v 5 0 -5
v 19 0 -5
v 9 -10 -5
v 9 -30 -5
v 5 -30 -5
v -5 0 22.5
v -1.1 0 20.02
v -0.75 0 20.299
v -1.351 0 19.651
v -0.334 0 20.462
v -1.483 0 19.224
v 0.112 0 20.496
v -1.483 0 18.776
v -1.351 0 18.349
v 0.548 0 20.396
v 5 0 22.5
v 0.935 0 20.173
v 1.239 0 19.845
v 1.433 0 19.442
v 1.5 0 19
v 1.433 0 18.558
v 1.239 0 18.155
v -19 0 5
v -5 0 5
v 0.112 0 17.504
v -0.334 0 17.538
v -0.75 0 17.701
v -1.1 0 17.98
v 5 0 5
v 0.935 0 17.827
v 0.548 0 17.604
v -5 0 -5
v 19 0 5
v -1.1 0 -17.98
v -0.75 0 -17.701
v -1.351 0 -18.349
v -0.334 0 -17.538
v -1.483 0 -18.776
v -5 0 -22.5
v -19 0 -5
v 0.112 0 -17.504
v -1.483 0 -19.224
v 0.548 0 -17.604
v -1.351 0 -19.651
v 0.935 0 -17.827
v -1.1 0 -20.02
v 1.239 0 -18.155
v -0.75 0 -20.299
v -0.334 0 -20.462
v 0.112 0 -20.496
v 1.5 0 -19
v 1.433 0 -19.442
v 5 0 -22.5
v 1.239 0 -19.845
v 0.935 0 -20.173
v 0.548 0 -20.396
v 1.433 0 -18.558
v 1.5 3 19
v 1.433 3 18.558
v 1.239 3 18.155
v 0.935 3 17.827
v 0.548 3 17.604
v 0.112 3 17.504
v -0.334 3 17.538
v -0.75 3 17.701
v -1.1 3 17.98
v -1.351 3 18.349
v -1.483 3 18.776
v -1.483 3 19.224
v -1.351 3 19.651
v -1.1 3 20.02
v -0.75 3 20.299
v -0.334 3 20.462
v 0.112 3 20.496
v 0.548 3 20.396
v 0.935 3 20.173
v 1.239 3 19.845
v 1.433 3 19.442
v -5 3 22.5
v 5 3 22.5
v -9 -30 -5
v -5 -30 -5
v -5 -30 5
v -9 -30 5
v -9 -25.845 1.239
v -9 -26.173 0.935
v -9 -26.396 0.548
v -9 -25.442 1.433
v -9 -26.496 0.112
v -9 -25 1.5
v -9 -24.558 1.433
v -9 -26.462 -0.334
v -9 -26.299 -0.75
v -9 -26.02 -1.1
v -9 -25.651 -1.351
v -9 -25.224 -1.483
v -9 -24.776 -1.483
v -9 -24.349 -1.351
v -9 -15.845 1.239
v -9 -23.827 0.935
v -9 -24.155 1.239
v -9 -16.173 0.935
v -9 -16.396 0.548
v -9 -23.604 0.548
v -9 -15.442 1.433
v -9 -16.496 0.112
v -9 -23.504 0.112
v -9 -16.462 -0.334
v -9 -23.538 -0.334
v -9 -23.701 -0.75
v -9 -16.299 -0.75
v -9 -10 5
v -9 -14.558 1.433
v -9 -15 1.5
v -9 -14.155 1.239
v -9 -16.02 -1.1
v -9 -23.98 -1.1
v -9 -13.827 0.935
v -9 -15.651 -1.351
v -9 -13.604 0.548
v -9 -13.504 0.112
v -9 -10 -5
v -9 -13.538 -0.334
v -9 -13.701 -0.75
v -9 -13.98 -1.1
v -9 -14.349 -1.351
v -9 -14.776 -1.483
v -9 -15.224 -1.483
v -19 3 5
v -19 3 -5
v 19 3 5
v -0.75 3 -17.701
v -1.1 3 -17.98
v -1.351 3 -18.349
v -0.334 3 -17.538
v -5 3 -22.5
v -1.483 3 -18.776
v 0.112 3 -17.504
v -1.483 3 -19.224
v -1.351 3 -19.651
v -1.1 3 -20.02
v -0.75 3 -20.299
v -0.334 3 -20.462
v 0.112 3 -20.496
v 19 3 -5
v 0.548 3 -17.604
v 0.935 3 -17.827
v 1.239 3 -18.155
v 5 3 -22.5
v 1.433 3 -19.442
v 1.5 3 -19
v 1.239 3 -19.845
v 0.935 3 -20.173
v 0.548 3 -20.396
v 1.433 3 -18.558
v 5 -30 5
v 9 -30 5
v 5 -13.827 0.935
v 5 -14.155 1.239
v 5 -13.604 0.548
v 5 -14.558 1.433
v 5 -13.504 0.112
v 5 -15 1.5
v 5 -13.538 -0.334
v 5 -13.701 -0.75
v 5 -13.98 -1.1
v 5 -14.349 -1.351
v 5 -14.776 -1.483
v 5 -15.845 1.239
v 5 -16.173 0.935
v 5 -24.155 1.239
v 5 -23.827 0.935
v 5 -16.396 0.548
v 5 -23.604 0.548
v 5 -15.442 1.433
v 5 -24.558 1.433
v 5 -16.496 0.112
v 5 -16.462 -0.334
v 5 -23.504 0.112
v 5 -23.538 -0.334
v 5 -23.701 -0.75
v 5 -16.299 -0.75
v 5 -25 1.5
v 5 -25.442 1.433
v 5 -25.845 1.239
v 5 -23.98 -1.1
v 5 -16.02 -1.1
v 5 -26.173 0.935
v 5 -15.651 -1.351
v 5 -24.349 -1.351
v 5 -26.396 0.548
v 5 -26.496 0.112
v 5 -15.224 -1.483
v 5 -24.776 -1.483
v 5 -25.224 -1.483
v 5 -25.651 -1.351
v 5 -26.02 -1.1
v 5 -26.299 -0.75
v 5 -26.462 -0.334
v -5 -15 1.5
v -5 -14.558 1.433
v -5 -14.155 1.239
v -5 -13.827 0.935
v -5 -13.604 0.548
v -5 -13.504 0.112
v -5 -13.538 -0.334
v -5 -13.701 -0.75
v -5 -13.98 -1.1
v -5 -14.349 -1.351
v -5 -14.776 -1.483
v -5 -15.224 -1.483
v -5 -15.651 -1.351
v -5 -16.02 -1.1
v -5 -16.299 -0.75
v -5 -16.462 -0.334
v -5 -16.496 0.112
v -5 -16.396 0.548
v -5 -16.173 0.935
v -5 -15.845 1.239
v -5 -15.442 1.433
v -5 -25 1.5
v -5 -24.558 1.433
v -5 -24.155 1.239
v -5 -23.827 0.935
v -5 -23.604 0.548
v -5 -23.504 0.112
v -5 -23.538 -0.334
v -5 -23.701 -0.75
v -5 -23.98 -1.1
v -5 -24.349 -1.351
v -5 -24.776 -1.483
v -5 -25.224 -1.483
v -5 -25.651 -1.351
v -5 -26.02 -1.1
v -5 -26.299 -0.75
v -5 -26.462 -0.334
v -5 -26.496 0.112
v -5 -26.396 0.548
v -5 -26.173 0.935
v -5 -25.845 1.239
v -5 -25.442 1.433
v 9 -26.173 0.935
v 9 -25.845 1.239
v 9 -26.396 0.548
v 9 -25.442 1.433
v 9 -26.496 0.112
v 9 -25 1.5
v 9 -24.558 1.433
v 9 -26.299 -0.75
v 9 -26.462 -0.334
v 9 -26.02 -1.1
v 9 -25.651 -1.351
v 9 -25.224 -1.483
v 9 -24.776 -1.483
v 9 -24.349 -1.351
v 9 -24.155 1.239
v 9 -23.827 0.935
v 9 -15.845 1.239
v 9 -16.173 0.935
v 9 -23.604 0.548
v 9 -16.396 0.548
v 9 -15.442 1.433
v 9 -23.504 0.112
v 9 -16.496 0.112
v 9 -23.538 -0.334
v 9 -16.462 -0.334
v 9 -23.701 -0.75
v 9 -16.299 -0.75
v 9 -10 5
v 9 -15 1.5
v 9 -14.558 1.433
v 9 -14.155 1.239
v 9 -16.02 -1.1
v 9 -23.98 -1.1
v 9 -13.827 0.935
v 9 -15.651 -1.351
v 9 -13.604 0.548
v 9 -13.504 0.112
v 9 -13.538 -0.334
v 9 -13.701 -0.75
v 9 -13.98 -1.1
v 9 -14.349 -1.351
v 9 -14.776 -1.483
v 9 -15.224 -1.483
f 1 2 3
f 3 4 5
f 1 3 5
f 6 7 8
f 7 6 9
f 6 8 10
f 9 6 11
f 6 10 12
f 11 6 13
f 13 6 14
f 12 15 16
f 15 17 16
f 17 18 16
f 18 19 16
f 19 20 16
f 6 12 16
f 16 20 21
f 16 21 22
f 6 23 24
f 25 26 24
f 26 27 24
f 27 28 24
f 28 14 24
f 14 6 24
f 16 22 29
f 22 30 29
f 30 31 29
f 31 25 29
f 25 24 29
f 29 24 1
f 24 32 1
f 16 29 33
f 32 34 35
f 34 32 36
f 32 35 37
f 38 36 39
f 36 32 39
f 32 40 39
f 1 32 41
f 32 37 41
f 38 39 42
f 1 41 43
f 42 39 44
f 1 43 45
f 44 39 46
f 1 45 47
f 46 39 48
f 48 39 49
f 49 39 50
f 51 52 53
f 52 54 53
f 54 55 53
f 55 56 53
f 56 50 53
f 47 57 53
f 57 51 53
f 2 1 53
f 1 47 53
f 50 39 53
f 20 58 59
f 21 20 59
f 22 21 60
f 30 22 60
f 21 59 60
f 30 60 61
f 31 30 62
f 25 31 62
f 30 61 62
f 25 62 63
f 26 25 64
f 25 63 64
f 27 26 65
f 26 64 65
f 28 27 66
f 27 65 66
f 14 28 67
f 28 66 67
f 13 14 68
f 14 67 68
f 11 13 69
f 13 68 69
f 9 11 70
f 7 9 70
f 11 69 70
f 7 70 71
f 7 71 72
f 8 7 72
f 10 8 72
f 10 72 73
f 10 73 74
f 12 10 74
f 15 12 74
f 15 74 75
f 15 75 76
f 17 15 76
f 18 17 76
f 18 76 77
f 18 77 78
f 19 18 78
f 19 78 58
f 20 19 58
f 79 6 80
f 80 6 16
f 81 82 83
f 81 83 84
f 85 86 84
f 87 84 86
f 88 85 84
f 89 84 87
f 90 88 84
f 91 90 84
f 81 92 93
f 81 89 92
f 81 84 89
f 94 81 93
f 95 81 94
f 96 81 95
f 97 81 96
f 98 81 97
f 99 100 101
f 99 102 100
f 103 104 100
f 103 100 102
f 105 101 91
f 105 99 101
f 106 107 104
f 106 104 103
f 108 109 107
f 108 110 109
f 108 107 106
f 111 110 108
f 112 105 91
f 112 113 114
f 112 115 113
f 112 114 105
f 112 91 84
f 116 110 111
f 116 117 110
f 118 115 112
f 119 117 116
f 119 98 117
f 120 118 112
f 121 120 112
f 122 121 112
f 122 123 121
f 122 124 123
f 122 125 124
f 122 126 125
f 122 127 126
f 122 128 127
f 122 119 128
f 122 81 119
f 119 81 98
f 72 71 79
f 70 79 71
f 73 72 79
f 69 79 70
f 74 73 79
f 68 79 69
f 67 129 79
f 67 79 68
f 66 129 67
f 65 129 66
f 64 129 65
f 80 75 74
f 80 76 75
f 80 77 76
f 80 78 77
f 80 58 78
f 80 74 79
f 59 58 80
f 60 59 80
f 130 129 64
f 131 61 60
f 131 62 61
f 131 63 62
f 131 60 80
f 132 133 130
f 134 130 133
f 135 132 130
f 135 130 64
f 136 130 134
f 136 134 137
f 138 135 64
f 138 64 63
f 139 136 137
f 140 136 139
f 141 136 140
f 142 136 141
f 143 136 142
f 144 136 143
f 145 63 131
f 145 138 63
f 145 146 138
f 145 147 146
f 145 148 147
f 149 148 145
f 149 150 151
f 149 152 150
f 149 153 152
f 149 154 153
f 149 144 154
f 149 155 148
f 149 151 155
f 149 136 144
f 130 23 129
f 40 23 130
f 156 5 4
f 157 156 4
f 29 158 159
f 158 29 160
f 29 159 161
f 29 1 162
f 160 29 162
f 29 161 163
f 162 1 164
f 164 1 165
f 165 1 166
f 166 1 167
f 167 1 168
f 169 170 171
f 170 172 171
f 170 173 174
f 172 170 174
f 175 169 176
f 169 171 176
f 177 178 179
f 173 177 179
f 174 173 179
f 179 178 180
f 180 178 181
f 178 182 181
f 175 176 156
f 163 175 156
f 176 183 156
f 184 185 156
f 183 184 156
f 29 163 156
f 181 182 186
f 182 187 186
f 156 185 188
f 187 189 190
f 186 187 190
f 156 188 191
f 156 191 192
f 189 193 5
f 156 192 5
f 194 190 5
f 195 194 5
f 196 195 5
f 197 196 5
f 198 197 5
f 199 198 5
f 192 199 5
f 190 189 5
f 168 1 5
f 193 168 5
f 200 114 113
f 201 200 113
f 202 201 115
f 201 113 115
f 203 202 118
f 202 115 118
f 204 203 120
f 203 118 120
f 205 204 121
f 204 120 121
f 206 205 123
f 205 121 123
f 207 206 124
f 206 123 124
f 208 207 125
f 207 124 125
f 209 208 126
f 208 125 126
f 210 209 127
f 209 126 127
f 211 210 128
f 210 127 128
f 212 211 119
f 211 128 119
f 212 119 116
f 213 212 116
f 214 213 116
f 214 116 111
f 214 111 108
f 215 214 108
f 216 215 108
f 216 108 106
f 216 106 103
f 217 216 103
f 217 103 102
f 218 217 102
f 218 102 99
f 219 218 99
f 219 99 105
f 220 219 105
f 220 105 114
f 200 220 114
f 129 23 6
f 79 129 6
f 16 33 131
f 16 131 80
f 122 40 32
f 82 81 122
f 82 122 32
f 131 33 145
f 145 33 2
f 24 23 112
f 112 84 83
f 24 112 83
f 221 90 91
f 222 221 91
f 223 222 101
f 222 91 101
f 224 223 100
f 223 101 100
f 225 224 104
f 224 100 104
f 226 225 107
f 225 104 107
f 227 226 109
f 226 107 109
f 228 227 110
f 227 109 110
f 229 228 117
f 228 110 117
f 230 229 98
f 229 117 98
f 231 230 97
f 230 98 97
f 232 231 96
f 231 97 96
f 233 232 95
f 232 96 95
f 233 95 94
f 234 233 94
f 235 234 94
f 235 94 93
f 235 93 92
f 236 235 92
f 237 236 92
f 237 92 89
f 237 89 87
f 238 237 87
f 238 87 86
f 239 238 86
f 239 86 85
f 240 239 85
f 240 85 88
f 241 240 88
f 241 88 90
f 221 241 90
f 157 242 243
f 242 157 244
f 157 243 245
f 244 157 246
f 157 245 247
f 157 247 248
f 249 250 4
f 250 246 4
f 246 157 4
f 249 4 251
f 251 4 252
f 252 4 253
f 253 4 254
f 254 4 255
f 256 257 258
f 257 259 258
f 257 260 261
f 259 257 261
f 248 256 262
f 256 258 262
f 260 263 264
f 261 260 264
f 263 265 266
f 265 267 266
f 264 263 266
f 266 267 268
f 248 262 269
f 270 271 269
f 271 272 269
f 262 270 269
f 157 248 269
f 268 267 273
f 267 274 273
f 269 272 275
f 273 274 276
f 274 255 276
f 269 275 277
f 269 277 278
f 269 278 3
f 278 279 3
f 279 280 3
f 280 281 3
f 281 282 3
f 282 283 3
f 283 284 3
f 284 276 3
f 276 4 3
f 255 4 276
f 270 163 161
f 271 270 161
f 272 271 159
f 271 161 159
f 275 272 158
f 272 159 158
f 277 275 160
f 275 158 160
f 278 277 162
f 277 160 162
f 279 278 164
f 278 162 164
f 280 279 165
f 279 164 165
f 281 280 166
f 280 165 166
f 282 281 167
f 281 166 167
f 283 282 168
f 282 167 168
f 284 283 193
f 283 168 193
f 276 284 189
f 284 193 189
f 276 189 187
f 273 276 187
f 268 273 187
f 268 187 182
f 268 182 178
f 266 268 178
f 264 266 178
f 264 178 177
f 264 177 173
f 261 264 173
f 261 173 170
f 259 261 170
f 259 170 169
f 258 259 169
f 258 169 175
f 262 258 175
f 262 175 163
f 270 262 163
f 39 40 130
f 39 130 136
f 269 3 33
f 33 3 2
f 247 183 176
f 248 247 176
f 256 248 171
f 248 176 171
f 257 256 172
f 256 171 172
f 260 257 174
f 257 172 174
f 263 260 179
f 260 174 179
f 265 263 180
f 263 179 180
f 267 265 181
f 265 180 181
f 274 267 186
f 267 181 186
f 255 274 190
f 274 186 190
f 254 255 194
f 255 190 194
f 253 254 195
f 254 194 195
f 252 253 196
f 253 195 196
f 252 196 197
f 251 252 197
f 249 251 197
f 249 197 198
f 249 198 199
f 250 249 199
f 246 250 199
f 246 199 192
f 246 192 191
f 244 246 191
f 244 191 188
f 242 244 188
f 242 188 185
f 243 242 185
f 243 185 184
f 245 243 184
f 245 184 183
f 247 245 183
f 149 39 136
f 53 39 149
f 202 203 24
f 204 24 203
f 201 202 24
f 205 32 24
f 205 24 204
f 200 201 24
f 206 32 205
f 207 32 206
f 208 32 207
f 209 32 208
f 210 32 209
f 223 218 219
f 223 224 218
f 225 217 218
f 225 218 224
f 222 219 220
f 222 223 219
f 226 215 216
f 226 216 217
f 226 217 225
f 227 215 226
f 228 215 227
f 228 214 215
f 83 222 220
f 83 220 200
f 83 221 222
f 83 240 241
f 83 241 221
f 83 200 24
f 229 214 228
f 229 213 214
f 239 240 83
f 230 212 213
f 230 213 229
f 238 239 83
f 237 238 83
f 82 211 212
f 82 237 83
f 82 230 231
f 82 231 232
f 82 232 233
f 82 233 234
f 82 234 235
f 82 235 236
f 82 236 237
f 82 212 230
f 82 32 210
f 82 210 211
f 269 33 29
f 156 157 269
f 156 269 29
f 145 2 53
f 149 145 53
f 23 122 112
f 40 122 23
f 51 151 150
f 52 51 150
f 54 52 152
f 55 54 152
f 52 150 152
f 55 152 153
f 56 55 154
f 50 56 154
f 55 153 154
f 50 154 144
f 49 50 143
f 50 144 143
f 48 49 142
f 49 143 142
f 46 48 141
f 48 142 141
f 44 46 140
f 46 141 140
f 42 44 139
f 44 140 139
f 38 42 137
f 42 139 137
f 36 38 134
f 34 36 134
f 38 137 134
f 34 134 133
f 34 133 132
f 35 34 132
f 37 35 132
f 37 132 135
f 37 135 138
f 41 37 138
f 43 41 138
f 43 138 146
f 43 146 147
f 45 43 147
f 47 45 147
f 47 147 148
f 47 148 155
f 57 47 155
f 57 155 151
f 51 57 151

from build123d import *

# Parameters (mm, degrees)
SKETCH_1_W            = 38
SKETCH_1_H            = 45
EXTRUDE_1_DEPTH       = 3
EXTRUDE_2_DEPTH       = 10
HOLE_WIZARD_3_0_3_1_D = 3
HOLE_WIZARD_3_0_3_2_D = 3
CUT_EXTRUDE_1_DEPTH   = 200
MIRROR_3_COPY_1_DEPTH = 200


with BuildPart() as part:
    # 草图1 → 凸台-拉伸1 (new body)
    with BuildSketch(Plane(origin=(0, 0, 0), x_dir=(1, 0, 0), z_dir=(0, 1, 0))):
        Rectangle(SKETCH_1_W, SKETCH_1_H)
    extrude(amount=EXTRUDE_1_DEPTH)

    # 草图3 → 凸台-拉伸2 (add)
    with BuildSketch(Plane(origin=(0, 0, -5), x_dir=(1, 0, 0), z_dir=(0, 0, -1))):
        Polygon((-5, 0), (-5, 30), (-9, 30), (-9, 10), (-19, 0), align=None)
    extrude_2 = extrude(amount=-EXTRUDE_2_DEPTH)

    # 镜向1: 凸台-拉伸2 across plane
    add(extrude_2.mirror(Plane(origin=(0, 0, 0), x_dir=(0, 0, 1), z_dir=(1, 0, 0))))

    # Ø3.0 (3) 直径孔1 (through all)
    with Locations(Plane(origin=(0, 0, 0), x_dir=(-1, 0, 0), z_dir=(0, -1, 0))):
        with Locations((0, -19), (0, 19)):
            Hole(HOLE_WIZARD_3_0_3_1_D / 2)

    # Ø3.0 (3) 直径孔2 (through all)
    with Locations(Plane(origin=(9, 0, 0), x_dir=(0, 0, -1), z_dir=(1, 0, 0))):
        with Locations((0, -25), (0, -15)):
            Hole(HOLE_WIZARD_3_0_3_2_D / 2)

    # 草图8 → 切除-拉伸1 (cut)
    with BuildSketch(Plane(origin=(0, 0, 0), x_dir=(-1, 0, 0), z_dir=(0, -1, 0))):
        Polygon((19, -5), (5, -22.5), (19, -22.5), align=None)
    cut_extrude_1 = extrude(amount=-CUT_EXTRUDE_1_DEPTH, mode=Mode.SUBTRACT)

    # 镜向2: 切除-拉伸1 across plane
    add(cut_extrude_1.mirror(Plane(origin=(0, 0, 0), x_dir=(0, 0, 1), z_dir=(1, 0, 0))), mode=Mode.SUBTRACT)

    # 镜向3: 切除-拉伸1 across plane
    add(cut_extrude_1.mirror(Plane(origin=(0, 0, 0), x_dir=(1, 0, 0), z_dir=(0, 0, -1))), mode=Mode.SUBTRACT)

    # 镜向3 copy 1 sketch → 镜向3 copy 1 (cut)
    with BuildSketch(Plane.XZ):
        Polygon((19, -5), (5, -22.5), (19, -22.5), align=None)
    extrude(amount=-MIRROR_3_COPY_1_DEPTH, mode=Mode.SUBTRACT)


solid = part.part
